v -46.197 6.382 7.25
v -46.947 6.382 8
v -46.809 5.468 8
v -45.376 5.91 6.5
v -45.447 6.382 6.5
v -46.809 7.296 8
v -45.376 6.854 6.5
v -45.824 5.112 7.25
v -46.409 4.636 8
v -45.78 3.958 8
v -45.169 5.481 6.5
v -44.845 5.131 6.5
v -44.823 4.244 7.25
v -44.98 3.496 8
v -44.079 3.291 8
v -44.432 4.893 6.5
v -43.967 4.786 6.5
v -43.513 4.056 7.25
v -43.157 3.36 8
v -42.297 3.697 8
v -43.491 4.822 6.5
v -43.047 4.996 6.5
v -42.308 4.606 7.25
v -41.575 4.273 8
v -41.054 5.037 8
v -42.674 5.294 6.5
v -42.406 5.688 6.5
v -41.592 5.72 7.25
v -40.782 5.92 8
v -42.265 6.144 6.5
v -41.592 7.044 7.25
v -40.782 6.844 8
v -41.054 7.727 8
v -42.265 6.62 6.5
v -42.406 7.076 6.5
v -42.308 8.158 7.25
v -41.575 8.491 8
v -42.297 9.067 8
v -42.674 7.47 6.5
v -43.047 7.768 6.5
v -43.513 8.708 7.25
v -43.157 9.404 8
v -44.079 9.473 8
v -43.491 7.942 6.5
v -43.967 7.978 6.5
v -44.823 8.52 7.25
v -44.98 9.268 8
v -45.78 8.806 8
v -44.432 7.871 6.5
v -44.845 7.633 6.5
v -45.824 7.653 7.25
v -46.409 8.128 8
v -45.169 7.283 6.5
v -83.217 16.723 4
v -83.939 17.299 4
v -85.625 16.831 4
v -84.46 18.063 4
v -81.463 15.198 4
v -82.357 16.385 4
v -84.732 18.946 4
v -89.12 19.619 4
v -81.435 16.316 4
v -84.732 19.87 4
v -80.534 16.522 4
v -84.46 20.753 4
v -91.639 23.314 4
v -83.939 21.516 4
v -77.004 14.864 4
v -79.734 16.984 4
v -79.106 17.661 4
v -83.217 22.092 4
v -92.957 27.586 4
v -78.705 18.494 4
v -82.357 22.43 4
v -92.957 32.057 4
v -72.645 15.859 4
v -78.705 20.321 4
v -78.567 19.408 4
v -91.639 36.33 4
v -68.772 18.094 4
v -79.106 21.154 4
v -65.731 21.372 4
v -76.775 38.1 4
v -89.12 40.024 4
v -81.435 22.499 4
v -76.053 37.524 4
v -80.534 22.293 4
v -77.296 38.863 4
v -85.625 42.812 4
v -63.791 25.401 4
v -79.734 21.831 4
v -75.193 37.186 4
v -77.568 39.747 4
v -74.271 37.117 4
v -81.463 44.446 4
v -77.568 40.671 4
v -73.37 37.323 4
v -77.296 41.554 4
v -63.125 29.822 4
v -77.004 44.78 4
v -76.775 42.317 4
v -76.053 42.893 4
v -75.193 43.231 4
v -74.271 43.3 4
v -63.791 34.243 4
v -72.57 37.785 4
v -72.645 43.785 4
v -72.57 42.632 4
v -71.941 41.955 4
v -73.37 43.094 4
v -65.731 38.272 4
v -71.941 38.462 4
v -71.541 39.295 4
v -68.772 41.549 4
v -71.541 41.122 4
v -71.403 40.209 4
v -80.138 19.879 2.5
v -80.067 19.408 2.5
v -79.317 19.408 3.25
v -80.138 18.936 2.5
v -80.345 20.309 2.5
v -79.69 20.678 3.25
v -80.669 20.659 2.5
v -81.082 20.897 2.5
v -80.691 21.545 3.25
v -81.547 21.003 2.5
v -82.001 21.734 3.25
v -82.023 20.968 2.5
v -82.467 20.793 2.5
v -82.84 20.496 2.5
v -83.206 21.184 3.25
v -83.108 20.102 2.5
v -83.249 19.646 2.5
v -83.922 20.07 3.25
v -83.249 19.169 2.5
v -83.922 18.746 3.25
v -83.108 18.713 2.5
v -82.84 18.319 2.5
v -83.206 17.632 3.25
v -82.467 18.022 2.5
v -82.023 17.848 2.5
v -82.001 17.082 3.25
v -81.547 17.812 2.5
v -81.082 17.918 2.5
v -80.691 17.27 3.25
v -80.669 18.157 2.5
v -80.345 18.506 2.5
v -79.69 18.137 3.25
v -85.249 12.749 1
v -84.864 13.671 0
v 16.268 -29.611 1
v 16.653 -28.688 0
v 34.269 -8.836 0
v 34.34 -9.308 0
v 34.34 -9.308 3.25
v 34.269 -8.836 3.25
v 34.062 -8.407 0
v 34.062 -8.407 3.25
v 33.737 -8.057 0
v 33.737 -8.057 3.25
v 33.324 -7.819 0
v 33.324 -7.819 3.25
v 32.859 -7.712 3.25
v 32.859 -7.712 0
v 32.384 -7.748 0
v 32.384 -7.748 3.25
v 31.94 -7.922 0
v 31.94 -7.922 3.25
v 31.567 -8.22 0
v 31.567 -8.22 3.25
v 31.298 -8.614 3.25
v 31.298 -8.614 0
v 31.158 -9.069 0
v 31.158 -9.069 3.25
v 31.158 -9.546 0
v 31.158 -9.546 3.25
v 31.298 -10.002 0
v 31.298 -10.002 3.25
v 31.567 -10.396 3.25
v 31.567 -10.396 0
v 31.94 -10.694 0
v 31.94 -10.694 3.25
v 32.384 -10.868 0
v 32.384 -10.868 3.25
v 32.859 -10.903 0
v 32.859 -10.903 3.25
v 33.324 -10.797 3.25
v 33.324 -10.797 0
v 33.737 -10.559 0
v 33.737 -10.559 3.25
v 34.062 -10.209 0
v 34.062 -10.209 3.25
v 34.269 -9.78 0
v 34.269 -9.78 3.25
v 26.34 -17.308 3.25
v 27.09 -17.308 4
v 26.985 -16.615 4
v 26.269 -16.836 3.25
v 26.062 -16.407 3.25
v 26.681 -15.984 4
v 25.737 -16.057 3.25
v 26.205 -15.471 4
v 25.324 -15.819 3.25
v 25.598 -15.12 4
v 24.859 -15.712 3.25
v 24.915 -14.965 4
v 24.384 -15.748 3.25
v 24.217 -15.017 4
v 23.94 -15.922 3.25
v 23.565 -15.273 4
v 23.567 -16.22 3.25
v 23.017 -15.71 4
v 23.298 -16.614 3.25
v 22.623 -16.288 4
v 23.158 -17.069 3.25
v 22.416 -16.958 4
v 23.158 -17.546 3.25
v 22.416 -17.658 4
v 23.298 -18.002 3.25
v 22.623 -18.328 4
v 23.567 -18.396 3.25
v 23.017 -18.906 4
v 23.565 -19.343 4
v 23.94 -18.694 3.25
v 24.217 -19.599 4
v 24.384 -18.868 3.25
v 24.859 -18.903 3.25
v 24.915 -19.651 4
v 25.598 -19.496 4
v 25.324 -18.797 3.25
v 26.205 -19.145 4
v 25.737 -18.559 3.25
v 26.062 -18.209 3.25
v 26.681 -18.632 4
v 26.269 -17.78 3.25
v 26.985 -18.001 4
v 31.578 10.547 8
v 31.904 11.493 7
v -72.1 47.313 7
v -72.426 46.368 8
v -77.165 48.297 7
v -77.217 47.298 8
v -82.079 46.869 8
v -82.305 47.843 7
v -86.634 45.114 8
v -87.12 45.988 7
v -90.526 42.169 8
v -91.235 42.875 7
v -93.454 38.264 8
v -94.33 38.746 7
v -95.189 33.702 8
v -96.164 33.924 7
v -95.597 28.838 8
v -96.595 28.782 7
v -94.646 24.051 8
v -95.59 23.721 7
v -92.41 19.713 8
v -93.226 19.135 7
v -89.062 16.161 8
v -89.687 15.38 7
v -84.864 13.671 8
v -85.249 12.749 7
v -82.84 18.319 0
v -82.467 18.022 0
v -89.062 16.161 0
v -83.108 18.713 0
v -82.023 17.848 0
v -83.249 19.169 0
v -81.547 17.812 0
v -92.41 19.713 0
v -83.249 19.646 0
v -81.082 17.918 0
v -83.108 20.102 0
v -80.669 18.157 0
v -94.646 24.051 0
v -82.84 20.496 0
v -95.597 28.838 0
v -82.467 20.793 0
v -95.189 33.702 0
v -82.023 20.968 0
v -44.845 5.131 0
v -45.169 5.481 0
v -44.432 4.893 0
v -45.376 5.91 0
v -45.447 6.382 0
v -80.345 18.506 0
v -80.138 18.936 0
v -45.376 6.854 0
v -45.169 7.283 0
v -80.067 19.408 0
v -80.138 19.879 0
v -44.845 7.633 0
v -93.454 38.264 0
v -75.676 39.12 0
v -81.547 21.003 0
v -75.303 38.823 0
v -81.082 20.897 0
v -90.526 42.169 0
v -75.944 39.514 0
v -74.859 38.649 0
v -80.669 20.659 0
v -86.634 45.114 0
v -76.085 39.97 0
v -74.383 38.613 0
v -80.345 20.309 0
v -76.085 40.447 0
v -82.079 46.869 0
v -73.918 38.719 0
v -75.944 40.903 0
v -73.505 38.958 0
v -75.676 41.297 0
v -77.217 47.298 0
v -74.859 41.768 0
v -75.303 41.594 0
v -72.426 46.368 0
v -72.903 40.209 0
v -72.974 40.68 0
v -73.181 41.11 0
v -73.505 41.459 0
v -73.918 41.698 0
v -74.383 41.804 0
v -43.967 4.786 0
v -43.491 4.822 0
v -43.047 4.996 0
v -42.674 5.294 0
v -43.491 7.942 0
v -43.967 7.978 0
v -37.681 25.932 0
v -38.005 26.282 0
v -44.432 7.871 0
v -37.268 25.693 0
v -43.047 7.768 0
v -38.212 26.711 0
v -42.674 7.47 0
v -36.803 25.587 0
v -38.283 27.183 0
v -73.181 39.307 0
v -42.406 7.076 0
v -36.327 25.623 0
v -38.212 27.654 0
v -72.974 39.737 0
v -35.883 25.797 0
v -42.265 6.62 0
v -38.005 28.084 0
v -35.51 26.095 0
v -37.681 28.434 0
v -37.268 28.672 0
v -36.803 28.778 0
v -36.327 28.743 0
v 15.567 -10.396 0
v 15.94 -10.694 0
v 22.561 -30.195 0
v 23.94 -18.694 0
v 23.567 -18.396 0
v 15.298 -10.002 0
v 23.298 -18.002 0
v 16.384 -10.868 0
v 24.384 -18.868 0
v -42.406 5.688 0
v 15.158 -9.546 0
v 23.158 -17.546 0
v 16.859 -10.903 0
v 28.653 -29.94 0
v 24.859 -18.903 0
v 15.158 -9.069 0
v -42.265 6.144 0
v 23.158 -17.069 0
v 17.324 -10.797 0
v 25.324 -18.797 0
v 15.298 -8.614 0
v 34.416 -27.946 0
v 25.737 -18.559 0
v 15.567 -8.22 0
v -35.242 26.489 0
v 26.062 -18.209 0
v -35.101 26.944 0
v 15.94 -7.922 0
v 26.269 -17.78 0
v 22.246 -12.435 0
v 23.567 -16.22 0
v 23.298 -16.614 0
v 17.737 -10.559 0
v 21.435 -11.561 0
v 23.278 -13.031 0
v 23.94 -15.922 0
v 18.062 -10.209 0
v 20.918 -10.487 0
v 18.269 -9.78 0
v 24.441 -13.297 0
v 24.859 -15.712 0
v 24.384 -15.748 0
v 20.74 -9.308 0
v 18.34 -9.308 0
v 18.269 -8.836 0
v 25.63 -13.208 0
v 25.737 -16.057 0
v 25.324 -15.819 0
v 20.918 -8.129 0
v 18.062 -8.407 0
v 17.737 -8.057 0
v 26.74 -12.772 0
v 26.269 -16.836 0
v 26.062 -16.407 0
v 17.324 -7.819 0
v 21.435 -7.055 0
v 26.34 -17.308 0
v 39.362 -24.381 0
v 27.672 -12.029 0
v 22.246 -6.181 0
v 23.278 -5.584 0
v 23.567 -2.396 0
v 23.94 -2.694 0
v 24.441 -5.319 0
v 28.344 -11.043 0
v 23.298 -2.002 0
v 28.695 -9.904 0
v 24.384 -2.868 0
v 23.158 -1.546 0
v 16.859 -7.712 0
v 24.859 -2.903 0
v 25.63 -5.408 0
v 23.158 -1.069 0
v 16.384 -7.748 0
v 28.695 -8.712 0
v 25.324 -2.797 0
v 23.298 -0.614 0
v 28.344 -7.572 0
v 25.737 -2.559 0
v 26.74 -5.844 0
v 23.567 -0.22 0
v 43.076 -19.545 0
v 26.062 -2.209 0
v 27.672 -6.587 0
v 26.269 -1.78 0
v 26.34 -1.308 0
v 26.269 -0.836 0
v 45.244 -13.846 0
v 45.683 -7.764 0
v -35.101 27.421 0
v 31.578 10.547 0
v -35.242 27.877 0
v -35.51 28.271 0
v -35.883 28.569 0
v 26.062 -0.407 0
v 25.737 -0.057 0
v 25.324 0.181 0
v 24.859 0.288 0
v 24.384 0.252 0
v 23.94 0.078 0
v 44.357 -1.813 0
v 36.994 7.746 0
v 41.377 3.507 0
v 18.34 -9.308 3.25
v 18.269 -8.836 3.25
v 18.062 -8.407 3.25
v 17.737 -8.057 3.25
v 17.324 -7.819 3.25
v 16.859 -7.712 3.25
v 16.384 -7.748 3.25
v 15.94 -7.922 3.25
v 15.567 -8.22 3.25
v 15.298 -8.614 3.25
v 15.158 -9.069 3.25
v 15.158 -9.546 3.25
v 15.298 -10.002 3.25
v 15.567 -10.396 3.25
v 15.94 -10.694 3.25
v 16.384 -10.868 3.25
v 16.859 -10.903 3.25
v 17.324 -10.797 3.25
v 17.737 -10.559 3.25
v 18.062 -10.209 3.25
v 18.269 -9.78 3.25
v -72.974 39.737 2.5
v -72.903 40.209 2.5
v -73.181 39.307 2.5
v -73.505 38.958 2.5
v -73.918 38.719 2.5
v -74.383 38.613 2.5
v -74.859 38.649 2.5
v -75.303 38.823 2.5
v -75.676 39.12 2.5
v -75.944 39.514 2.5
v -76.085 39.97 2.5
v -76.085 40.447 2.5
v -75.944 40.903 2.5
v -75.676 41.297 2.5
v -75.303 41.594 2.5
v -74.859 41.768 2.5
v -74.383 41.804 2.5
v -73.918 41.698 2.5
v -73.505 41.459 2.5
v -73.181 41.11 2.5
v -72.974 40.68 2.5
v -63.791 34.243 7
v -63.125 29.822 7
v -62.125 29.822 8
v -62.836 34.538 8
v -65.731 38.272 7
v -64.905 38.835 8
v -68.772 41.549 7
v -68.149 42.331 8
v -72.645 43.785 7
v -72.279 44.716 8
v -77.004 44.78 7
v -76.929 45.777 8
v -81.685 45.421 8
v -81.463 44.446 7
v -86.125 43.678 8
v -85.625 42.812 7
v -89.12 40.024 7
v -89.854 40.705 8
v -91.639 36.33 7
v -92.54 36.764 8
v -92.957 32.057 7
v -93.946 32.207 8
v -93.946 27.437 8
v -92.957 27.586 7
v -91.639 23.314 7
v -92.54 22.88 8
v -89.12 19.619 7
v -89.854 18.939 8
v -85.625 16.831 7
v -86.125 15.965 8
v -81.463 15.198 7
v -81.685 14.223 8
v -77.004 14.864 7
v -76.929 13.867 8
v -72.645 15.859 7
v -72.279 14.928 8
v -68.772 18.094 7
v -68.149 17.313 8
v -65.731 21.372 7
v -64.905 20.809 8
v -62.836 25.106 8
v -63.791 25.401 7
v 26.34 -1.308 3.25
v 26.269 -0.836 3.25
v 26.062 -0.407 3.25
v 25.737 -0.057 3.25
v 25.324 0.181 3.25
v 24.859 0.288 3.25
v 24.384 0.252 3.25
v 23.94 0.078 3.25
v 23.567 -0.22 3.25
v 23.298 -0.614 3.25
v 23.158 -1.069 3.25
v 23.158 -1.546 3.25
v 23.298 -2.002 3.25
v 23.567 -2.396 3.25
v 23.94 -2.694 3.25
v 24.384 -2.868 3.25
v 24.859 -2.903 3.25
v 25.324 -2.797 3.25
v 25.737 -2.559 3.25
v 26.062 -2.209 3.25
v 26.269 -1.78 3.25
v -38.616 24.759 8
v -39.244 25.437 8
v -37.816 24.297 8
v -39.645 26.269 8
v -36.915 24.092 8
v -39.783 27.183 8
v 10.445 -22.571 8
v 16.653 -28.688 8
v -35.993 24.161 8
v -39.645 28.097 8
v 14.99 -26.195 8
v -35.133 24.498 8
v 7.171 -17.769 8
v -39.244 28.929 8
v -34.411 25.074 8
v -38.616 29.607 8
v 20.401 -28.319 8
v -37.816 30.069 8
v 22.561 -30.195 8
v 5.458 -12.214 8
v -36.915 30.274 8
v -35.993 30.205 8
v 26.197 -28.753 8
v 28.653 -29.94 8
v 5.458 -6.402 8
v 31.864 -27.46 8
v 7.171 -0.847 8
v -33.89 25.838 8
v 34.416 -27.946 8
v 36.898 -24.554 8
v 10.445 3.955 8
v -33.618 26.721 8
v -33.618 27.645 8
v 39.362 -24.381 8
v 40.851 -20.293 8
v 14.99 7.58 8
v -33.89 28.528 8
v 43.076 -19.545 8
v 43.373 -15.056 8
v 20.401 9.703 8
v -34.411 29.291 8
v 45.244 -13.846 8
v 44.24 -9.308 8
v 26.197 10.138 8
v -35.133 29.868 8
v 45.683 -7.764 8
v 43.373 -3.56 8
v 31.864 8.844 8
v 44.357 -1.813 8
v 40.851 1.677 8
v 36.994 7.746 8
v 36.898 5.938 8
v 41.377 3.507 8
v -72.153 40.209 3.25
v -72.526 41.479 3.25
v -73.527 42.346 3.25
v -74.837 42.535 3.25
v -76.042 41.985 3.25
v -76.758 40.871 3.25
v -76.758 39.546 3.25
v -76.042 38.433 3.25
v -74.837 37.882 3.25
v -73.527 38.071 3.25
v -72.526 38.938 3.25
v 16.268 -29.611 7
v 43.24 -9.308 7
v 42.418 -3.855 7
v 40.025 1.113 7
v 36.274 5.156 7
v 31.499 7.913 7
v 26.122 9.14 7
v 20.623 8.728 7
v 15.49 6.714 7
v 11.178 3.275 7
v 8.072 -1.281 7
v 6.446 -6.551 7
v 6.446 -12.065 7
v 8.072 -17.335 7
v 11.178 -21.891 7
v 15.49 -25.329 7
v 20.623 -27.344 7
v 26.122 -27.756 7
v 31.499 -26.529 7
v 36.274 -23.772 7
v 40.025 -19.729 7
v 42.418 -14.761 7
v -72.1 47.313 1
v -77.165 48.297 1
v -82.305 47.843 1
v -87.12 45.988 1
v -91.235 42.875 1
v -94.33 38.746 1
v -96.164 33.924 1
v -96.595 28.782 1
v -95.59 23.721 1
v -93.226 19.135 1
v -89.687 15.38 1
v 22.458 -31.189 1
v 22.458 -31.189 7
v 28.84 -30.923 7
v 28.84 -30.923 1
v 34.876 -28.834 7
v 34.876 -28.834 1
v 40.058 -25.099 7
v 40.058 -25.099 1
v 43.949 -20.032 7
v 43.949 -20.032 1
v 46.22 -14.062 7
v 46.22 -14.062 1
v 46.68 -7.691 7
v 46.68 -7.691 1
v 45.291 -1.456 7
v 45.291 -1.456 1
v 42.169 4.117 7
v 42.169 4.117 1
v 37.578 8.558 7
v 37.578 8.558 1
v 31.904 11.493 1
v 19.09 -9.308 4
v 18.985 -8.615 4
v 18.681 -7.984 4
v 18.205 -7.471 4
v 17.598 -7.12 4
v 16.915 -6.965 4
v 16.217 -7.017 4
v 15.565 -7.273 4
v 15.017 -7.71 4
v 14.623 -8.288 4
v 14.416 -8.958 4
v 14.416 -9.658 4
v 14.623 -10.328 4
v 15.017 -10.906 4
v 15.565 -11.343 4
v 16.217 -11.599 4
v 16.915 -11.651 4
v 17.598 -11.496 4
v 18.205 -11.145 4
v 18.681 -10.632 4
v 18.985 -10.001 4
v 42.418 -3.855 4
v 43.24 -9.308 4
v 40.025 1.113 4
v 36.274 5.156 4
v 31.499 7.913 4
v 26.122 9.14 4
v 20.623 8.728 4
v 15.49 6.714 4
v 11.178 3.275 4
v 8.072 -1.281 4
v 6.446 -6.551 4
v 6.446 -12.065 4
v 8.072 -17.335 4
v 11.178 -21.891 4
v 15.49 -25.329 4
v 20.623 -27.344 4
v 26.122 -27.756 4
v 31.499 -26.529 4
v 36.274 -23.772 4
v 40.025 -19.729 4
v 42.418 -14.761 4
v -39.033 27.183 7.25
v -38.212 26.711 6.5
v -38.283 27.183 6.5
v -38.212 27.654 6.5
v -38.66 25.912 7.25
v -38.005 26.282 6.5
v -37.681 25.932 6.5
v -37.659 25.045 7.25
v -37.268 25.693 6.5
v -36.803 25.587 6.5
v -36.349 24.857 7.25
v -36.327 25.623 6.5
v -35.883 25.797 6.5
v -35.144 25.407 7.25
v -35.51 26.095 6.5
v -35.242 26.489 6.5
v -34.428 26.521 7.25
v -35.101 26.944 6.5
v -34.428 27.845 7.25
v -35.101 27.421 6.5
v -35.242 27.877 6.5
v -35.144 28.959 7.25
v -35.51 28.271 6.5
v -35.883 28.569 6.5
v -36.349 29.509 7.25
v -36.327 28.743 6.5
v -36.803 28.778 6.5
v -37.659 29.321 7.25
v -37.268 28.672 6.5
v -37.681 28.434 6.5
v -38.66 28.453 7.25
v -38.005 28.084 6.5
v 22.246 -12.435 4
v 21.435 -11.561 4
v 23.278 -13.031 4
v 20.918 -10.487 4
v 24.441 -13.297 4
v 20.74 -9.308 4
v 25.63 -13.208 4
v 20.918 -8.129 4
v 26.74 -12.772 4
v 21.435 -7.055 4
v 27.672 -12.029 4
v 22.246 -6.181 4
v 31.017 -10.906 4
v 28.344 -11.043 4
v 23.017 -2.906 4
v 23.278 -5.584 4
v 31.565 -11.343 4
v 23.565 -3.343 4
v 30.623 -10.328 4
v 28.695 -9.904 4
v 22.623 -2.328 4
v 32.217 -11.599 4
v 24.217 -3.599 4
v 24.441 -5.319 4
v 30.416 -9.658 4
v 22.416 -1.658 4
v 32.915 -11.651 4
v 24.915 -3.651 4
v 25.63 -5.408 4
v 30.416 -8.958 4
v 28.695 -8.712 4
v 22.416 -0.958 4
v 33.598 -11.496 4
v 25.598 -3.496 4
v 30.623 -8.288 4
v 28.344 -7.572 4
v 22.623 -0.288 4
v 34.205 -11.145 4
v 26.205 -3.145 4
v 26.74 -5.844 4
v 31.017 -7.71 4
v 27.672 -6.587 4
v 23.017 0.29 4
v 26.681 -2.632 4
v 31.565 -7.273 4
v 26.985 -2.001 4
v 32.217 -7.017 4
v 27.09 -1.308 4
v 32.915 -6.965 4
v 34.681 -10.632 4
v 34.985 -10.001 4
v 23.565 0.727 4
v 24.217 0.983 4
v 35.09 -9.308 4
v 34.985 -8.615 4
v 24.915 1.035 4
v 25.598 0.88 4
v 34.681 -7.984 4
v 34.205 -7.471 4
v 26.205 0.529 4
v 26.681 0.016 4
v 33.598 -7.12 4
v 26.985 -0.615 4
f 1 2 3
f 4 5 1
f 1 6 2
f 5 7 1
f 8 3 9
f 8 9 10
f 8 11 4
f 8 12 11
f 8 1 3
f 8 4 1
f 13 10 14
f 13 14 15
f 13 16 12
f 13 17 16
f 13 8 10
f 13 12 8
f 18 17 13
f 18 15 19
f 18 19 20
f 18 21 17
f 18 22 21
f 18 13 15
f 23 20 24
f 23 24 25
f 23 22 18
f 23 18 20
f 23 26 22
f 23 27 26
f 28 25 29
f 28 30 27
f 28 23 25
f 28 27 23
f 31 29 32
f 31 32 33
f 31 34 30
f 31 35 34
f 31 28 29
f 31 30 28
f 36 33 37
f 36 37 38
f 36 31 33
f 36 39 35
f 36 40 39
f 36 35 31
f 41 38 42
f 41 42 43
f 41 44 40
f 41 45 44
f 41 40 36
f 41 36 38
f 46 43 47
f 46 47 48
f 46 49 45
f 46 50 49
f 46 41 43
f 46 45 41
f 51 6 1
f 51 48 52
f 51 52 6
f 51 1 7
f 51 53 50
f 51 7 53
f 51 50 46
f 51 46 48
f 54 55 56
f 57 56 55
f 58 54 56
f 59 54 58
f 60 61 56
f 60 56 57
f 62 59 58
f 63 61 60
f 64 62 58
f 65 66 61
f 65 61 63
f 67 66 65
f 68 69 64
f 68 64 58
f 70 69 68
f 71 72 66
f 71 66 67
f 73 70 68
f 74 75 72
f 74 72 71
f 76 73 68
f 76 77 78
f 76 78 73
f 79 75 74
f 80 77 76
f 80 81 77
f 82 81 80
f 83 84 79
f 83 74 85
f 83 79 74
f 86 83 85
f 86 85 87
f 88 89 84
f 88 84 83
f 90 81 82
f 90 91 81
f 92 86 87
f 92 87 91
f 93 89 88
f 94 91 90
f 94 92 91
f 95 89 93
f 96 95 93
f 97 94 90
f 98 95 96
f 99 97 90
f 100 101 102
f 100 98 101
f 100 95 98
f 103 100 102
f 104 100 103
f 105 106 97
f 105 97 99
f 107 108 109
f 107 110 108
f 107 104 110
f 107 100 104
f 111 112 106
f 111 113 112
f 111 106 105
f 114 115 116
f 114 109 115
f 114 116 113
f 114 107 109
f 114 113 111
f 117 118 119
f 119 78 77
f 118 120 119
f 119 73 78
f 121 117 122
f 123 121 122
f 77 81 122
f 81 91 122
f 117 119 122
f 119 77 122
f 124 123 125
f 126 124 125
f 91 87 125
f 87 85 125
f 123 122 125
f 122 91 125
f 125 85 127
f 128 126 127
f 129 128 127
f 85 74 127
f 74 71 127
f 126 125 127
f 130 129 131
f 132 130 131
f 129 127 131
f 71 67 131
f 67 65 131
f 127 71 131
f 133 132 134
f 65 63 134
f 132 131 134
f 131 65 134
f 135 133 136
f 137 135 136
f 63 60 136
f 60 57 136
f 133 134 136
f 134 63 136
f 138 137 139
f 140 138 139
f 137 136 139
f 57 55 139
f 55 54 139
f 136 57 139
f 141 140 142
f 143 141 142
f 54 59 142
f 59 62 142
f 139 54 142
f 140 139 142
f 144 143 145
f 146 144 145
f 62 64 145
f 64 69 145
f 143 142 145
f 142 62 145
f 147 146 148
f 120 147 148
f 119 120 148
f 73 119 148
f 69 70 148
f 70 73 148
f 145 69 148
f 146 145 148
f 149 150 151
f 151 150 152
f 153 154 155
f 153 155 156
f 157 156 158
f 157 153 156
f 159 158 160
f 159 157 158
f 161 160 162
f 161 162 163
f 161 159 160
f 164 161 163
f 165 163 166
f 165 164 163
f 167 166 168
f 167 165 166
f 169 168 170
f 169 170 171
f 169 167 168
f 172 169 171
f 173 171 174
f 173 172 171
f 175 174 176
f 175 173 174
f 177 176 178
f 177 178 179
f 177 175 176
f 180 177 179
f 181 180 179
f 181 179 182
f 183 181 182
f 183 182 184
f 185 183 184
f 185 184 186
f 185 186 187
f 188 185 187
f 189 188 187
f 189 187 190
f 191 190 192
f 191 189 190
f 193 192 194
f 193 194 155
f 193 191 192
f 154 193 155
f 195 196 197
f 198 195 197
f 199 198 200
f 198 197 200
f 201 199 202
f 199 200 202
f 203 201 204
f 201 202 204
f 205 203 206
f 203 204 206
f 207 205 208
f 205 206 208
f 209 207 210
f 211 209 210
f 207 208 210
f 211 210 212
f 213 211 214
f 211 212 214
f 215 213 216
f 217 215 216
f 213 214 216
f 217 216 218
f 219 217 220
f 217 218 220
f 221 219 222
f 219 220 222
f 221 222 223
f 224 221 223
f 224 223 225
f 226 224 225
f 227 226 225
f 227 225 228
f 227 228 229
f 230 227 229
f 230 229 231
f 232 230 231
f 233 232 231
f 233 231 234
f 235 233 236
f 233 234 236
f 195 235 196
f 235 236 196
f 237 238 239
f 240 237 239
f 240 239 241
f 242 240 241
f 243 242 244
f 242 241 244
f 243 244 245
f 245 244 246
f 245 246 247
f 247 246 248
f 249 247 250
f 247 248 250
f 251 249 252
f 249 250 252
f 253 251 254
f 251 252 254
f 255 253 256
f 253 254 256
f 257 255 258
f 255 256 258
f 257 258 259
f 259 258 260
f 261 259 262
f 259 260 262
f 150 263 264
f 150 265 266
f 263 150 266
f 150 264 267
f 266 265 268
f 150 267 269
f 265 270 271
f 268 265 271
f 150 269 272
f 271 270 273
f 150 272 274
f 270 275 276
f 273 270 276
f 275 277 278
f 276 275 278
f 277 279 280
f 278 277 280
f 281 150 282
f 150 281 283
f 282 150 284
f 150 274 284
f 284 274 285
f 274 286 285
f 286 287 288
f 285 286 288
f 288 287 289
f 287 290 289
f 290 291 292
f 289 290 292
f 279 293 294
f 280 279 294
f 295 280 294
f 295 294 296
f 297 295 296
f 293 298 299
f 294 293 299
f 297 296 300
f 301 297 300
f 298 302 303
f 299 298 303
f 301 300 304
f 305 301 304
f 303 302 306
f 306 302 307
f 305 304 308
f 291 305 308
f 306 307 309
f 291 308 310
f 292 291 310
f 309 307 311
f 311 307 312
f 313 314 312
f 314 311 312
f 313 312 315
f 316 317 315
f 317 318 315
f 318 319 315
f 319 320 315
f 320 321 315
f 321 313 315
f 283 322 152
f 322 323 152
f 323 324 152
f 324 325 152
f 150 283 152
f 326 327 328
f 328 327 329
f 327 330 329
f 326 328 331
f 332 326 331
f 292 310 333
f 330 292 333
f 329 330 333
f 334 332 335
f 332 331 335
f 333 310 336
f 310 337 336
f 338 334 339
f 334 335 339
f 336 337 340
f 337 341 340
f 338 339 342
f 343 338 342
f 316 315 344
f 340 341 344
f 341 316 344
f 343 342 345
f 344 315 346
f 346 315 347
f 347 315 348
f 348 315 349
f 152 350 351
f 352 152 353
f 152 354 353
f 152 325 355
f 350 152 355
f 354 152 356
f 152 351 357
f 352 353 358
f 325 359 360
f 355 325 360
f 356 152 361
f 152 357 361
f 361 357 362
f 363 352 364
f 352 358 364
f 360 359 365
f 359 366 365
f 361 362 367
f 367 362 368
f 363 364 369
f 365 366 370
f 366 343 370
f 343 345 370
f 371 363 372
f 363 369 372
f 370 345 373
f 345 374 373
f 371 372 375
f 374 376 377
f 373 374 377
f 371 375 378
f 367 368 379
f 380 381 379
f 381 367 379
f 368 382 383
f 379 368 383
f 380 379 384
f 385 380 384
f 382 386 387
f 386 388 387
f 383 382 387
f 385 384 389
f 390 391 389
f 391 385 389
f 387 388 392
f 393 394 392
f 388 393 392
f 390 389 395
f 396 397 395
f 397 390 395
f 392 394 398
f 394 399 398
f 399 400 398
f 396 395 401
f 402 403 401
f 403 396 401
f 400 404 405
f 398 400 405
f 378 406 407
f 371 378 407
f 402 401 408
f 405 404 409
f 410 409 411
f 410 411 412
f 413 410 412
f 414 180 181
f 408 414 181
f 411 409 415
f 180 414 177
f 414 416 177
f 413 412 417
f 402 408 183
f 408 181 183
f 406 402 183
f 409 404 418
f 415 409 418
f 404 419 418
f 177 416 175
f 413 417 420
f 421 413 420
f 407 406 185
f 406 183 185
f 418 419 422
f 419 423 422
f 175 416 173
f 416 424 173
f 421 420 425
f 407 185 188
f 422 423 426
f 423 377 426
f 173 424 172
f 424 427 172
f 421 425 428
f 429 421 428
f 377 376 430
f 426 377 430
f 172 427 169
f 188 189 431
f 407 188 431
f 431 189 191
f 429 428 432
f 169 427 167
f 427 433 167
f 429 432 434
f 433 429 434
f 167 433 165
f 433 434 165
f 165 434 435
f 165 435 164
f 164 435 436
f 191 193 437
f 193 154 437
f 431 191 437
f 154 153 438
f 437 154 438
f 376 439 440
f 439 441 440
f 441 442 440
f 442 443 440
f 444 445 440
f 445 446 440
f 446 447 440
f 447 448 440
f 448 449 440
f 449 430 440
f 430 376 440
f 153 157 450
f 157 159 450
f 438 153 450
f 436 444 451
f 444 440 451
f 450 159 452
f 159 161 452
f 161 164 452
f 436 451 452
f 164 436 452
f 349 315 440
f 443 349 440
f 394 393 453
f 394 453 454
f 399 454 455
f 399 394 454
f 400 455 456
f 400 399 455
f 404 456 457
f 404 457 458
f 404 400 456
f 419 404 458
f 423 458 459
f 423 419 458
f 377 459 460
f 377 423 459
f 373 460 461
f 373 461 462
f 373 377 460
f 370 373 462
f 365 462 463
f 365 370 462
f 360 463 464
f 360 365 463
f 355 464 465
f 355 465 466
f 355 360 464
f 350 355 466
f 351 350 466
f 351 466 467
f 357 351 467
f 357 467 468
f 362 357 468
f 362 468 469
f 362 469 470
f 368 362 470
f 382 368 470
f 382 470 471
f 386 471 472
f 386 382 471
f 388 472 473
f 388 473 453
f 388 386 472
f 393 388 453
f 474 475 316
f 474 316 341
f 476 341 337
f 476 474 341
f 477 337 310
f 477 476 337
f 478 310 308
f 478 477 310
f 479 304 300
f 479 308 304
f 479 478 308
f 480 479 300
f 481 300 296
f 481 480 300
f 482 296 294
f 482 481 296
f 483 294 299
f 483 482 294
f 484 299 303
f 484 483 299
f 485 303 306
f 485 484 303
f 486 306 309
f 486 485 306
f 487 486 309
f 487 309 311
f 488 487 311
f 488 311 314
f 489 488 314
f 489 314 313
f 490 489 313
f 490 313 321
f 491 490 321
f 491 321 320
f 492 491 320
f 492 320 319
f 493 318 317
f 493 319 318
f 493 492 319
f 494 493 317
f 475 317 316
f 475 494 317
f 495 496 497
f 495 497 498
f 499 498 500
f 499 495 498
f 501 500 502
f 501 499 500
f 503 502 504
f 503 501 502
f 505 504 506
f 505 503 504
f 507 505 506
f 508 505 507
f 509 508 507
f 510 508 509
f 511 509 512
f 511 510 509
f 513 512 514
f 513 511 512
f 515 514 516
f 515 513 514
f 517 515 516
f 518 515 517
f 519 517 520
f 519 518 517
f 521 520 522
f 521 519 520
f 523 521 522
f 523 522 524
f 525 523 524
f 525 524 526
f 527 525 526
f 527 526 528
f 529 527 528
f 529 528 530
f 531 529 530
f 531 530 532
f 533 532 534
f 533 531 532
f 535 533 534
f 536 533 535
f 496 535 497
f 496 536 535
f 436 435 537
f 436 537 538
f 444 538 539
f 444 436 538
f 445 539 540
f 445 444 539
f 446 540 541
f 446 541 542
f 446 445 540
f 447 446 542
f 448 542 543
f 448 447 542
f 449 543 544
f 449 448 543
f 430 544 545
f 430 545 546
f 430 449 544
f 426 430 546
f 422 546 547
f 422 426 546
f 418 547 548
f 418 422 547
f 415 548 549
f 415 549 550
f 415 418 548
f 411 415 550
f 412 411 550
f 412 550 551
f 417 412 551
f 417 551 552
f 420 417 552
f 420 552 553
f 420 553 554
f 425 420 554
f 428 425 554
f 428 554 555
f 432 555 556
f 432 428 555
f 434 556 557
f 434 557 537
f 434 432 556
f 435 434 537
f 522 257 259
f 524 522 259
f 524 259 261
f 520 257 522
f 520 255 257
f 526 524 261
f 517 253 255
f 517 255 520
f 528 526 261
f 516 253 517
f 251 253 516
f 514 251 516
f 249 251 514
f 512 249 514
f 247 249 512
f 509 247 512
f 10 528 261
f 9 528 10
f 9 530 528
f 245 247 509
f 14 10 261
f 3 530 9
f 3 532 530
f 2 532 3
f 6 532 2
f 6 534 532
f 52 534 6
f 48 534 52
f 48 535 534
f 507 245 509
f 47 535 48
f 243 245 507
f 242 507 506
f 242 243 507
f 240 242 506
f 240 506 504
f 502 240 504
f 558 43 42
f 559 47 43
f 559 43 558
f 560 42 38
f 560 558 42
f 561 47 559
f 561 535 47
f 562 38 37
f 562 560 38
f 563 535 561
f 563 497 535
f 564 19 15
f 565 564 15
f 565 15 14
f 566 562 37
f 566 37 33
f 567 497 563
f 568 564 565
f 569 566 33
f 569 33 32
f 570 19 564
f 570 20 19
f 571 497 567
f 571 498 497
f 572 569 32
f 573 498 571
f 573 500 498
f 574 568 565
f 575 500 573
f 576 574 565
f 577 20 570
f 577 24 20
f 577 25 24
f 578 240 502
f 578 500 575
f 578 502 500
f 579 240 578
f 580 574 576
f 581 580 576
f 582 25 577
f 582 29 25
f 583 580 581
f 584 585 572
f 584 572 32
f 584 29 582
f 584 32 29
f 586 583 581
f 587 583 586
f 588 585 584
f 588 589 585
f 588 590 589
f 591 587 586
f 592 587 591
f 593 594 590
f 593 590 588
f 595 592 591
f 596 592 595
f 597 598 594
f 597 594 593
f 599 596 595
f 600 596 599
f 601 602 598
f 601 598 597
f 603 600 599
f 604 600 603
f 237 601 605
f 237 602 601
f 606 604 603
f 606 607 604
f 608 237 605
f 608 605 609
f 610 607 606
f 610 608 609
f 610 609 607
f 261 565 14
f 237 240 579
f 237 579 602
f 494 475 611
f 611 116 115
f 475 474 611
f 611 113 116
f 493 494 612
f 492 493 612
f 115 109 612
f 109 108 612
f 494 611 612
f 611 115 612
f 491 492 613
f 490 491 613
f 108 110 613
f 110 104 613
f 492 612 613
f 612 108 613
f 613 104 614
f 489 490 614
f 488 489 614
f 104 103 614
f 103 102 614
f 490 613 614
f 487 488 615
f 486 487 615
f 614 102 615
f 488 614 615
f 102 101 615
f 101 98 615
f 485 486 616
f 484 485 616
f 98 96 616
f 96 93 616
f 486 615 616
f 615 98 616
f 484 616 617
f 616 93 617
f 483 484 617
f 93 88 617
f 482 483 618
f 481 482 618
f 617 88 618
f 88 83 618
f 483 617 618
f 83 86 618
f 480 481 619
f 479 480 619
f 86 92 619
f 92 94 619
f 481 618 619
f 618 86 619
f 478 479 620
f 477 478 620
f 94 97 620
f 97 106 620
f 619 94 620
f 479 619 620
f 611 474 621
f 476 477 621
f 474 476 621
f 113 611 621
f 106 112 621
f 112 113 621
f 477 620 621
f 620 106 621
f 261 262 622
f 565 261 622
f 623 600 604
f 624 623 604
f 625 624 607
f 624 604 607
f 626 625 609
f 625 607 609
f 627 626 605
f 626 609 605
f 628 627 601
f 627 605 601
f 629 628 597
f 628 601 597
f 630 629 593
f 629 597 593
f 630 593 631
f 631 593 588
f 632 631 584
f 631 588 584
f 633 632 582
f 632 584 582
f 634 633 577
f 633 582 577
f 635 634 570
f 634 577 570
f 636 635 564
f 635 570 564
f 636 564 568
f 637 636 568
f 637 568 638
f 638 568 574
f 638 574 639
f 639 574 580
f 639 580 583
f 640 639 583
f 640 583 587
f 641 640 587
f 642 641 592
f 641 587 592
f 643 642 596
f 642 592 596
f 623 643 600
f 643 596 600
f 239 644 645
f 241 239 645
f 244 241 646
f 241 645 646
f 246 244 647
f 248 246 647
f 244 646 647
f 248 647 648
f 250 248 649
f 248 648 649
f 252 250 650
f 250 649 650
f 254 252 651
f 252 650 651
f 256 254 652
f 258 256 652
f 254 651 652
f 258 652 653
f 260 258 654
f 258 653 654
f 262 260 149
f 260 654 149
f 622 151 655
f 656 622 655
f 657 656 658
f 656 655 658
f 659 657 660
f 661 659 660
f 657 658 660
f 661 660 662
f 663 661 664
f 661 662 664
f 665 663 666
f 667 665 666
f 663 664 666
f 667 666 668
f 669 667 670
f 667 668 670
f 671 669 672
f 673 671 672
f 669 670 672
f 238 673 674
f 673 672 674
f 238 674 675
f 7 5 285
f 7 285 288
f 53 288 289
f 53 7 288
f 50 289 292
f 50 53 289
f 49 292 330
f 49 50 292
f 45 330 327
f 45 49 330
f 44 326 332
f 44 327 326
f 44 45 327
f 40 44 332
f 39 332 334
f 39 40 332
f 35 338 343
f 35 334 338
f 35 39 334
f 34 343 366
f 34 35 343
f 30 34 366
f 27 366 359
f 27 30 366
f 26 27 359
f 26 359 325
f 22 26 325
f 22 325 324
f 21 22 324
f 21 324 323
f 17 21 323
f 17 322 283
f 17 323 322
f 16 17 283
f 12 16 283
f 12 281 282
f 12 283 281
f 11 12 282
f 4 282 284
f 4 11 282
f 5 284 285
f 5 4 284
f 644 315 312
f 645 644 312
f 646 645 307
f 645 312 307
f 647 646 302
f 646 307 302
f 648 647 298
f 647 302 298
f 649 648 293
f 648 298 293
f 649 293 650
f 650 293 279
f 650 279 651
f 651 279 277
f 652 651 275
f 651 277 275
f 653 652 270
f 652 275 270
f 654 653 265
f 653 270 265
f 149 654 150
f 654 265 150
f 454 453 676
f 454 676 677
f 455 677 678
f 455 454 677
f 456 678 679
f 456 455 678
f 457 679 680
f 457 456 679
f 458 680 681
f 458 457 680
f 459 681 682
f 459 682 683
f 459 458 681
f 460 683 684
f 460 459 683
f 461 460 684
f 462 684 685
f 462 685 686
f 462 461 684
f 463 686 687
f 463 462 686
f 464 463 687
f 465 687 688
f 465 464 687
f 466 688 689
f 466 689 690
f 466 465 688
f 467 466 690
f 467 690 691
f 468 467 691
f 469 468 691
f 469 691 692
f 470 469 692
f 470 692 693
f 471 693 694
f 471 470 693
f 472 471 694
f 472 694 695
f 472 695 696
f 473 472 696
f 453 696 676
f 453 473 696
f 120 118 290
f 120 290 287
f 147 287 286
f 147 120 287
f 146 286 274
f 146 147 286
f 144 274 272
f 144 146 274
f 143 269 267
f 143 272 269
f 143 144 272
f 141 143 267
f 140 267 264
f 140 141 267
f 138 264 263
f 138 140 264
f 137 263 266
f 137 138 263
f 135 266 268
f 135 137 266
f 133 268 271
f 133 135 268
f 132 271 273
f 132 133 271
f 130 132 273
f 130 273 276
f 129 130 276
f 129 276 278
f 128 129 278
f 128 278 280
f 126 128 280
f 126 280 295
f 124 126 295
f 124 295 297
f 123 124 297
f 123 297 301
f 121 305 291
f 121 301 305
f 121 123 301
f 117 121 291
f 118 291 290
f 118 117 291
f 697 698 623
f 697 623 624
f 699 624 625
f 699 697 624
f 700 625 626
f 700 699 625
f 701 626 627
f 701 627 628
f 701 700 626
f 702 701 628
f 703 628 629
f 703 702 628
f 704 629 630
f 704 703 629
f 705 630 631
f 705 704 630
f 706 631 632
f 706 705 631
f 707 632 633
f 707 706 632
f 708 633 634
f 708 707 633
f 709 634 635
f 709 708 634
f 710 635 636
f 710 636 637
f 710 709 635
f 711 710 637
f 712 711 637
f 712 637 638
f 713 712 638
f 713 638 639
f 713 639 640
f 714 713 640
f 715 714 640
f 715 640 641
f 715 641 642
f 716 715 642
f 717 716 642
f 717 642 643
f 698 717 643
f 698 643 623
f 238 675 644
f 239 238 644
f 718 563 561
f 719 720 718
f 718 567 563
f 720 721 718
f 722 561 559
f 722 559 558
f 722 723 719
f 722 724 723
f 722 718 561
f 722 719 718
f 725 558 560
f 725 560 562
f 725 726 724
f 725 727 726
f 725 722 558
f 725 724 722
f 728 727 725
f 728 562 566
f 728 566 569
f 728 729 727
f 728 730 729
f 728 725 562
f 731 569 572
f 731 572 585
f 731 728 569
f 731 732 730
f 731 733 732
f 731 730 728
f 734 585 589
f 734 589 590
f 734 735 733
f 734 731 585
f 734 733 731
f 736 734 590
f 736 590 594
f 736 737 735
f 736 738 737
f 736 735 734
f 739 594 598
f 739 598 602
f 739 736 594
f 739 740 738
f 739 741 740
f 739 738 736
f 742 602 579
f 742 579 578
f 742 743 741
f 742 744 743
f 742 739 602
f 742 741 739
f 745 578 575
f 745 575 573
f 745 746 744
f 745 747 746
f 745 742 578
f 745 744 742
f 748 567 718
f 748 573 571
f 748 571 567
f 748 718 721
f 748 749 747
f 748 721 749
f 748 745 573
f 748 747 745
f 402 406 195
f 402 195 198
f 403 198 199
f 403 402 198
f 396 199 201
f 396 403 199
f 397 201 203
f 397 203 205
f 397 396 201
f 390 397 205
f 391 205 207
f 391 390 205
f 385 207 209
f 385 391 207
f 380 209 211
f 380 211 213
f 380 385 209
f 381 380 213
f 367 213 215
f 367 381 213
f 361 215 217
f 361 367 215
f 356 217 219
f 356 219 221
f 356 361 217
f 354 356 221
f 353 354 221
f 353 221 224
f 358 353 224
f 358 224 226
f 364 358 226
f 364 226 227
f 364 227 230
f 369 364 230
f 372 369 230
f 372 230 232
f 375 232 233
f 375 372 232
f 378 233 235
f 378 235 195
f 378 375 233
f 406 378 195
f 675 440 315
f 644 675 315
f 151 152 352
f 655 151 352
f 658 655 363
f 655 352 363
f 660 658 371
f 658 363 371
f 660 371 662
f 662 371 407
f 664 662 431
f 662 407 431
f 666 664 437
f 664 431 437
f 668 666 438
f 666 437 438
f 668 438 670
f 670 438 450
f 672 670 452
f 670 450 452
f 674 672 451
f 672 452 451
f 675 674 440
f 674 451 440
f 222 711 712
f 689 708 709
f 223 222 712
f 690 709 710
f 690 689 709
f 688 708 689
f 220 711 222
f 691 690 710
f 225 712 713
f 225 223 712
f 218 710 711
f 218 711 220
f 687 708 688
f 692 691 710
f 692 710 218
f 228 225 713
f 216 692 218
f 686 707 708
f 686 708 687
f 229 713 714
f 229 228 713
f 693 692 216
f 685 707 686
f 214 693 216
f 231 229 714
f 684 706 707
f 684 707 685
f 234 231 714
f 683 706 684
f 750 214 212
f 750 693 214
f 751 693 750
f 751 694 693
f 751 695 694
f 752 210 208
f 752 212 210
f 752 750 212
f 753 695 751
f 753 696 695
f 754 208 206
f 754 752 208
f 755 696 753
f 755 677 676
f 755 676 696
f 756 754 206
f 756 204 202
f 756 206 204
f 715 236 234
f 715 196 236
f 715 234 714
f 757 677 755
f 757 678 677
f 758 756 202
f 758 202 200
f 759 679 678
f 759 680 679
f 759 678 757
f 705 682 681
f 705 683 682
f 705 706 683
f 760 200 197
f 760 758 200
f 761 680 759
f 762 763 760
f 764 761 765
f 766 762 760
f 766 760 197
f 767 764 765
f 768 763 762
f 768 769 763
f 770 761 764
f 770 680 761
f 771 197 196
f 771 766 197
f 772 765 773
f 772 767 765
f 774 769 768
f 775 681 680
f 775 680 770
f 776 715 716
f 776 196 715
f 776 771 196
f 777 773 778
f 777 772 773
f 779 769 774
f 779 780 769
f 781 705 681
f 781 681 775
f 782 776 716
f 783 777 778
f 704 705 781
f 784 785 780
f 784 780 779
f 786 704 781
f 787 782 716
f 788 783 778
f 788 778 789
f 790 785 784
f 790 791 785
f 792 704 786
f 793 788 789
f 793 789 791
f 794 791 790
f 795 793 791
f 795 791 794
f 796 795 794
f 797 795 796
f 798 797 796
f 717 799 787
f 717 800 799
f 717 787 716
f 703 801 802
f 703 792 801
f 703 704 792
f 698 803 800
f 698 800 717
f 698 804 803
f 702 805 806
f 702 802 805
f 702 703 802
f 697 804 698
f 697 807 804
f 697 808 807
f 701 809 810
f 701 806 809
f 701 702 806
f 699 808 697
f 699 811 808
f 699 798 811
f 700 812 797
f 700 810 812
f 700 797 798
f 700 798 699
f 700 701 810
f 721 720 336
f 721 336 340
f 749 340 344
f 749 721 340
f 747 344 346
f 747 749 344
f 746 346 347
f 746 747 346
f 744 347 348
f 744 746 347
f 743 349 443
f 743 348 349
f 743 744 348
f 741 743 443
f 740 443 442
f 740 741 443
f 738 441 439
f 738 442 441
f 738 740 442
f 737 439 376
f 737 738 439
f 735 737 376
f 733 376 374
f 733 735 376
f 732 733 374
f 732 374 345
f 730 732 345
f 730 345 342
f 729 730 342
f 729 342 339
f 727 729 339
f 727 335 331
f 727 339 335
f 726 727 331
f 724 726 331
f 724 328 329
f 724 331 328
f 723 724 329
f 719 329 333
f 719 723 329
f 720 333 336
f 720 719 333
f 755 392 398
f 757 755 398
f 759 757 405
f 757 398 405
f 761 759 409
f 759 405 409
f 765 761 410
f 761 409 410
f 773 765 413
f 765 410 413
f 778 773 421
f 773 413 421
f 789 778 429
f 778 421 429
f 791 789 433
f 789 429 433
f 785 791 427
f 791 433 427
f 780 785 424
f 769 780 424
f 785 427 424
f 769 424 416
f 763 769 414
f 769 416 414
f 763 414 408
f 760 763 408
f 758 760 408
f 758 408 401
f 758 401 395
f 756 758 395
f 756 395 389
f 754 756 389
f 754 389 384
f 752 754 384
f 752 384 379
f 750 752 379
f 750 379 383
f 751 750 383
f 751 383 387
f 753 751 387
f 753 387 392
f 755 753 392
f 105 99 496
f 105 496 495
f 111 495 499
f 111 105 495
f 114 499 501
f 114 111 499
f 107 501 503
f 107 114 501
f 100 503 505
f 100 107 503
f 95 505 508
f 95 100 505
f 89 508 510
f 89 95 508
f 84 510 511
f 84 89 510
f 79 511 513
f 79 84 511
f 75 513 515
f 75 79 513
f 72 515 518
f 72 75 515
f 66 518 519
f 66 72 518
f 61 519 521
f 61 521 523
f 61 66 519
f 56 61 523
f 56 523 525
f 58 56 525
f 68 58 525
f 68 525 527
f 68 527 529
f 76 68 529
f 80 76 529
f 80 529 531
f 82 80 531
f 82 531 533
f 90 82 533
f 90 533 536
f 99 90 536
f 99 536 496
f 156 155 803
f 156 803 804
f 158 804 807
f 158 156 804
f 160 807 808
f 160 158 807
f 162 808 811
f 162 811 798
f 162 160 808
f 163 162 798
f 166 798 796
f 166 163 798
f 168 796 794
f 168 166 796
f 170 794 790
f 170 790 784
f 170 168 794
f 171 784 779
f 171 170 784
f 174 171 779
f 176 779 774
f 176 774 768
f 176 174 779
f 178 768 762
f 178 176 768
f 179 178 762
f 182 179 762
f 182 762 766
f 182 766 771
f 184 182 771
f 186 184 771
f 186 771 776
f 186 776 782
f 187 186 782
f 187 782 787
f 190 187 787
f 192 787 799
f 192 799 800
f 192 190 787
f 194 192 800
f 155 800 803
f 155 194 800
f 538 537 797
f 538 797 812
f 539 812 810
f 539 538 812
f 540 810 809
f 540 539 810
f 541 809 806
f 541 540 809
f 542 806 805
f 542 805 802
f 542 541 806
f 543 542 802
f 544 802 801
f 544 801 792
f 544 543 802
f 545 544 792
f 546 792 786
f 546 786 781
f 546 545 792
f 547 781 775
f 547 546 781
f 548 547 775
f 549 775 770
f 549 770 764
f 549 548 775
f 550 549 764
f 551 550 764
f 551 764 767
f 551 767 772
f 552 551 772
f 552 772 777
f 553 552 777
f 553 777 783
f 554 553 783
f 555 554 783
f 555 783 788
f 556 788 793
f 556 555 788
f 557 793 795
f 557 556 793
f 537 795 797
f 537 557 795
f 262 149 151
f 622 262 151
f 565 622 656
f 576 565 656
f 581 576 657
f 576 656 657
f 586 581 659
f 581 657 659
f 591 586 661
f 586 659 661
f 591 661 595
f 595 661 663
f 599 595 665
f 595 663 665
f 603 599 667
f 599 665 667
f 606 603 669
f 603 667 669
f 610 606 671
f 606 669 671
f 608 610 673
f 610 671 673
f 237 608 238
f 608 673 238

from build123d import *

# Parameters (mm, degrees)
SKETCH1_R               = 18.5
SKETCH1_R_2             = 15
BOSS_EXTRUDE1_DEPTH     = 8
SKETCH1_5_R             = 18.5
SKETCH1_5_R_2           = 1.6
SKETCH1_5_R_3           = 15
BOSS_EXTRUDE4_DEPTH     = 4
CHAMFER1_SIZE           = 0.75
CHAMFER3_SIZE           = 1
SKETCH8_R               = 4
CUT_EXTRUDE1_DEPTH      = 109.32973067
CUT_EXTRUDE2_DEPTH      = 109.32973067
CUT_EXTRUDE2_DEPTH_BACK = 109.32973067
SKETCH10_R              = 1.6
CHAMFER4_SIZE           = 1.5
CHAMFER5_SIZE           = 1


with BuildPart() as part:
    # Sketch1 → Boss-Extrude1 (new body)
    with BuildSketch(Plane.XY):
        with BuildLine():
            ThreePointArc((-72.100325672, 47.313455418), (-95.415884826, 36.399419854), (-85.248853195, 12.748564927))
            Line((-85.248853195, 12.748564927), (16.267852417, -29.611303837))
            ThreePointArc((16.267852417, -29.611303837), (45.302324024, -17.129962587), (31.903939201, 11.49289026))
            Line((31.903939201, 11.49289026), (-72.100325672, 47.313455418))
        make_face()
        with Locations((24.73982617, -9.307962715)):
            Circle(SKETCH1_R, mode=Mode.SUBTRACT)
        with Locations((-78.124693448, 29.821829053)):
            Circle(SKETCH1_R_2, mode=Mode.SUBTRACT)
    extrude(amount=BOSS_EXTRUDE1_DEPTH)

    # Sketch1<5> → Boss-Extrude4 (add)
    # profile 1 of 2: a face of its own
    with BuildSketch(Plane.XY):
        with Locations((24.73982617, -9.307962715)):
            Circle(SKETCH1_5_R)
        with Locations((24.73982617, -17.307962715)):
            Circle(SKETCH1_5_R_2, mode=Mode.SUBTRACT)
        with Locations((16.73982617, -9.307962715)):
            Circle(SKETCH1_5_R_2, mode=Mode.SUBTRACT)
        with Locations((32.73982617, -9.307962715)):
            Circle(SKETCH1_5_R_2, mode=Mode.SUBTRACT)
        with Locations((24.73982617, -1.307962715)):
            Circle(SKETCH1_5_R_2, mode=Mode.SUBTRACT)
    # profile 2 of 2: a face of its own
    with BuildSketch(Plane.XY):
        with Locations((-78.124693448, 29.821829053)):
            Circle(SKETCH1_5_R_3)
    extrude(amount=BOSS_EXTRUDE4_DEPTH)

    # Chamfer1
    chamfer1_edges = [part.edges().sort_by_distance(p)[0] for p in [
        (15.13982617, -9.307962715, 4),
        (23.13982617, -17.307962715, 4),
        (31.13982617, -9.307962715, 4),
        (23.13982617, -1.307962715, 4),
    ]]
    chamfer(chamfer1_edges, length=CHAMFER1_SIZE)

    # Chamfer3
    chamfer3_edges = [part.edges().sort_by_distance(p)[0] for p in [
        (6.23982617, -9.307962715, 8),
        (-93.124693448, 29.821829053, 8),
    ]]
    chamfer(chamfer3_edges, length=CHAMFER3_SIZE)

    # Sketch8 → Cut-Extrude1 (cut, through all)
    with BuildSketch(Plane(origin=(0, 0, 0), x_dir=(-1, 0, 0), z_dir=(0, 0, -1))):
        with Locations((-24.73982617, -9.307962715)):
            Circle(SKETCH8_R)
    extrude(amount=-CUT_EXTRUDE1_DEPTH, mode=Mode.SUBTRACT)

    # Sketch10 → Cut-Extrude2 (cut, two sides: drawn at the far end of the back side and taken through both)
    with BuildSketch(Plane(origin=(0, 0, 0), x_dir=(-1, 0, 0), z_dir=(0, 0, -1)).offset(-CUT_EXTRUDE2_DEPTH_BACK)):
        with Locations((74.502789559, 40.208531531)):
            Circle(SKETCH10_R)
        with Locations((36.683056878, 27.182871474)):
            Circle(SKETCH10_R)
        with Locations((81.66690259, 19.407678557)):
            Circle(SKETCH10_R)
        with Locations((43.847169909, 6.382018499)):
            Circle(SKETCH10_R)
    extrude(amount=CUT_EXTRUDE2_DEPTH + CUT_EXTRUDE2_DEPTH_BACK, mode=Mode.SUBTRACT)

    # Chamfer4
    chamfer4_edges = [part.edges().sort_by_distance(p)[0] for p in [
        (-72.902789559, 40.208531531, 4),
        (-42.247169909, 6.382018499, 8),
        (-35.083056878, 27.182871474, 8),
        (-80.06690259, 19.407678557, 4),
    ]]
    chamfer(chamfer4_edges, length=CHAMFER4_SIZE)

    # Chamfer5
    chamfer5_edges = [part.edges().sort_by_distance(p)[0] for p in [
        (-34.490500389, -8.431369455, 0),
        (-95.415884826, 36.399419854, 0),
        (45.302324024, -17.129962587, 0),
        (-20.098193235, 29.403172839, 0),
        (-34.490500389, -8.431369455, 8),
        (-95.415884826, 36.399419854, 8),
        (45.302324024, -17.129962587, 8),
        (-20.098193235, 29.403172839, 8),
    ]]
    chamfer(chamfer5_edges, length=CHAMFER5_SIZE)


solid = part.part
